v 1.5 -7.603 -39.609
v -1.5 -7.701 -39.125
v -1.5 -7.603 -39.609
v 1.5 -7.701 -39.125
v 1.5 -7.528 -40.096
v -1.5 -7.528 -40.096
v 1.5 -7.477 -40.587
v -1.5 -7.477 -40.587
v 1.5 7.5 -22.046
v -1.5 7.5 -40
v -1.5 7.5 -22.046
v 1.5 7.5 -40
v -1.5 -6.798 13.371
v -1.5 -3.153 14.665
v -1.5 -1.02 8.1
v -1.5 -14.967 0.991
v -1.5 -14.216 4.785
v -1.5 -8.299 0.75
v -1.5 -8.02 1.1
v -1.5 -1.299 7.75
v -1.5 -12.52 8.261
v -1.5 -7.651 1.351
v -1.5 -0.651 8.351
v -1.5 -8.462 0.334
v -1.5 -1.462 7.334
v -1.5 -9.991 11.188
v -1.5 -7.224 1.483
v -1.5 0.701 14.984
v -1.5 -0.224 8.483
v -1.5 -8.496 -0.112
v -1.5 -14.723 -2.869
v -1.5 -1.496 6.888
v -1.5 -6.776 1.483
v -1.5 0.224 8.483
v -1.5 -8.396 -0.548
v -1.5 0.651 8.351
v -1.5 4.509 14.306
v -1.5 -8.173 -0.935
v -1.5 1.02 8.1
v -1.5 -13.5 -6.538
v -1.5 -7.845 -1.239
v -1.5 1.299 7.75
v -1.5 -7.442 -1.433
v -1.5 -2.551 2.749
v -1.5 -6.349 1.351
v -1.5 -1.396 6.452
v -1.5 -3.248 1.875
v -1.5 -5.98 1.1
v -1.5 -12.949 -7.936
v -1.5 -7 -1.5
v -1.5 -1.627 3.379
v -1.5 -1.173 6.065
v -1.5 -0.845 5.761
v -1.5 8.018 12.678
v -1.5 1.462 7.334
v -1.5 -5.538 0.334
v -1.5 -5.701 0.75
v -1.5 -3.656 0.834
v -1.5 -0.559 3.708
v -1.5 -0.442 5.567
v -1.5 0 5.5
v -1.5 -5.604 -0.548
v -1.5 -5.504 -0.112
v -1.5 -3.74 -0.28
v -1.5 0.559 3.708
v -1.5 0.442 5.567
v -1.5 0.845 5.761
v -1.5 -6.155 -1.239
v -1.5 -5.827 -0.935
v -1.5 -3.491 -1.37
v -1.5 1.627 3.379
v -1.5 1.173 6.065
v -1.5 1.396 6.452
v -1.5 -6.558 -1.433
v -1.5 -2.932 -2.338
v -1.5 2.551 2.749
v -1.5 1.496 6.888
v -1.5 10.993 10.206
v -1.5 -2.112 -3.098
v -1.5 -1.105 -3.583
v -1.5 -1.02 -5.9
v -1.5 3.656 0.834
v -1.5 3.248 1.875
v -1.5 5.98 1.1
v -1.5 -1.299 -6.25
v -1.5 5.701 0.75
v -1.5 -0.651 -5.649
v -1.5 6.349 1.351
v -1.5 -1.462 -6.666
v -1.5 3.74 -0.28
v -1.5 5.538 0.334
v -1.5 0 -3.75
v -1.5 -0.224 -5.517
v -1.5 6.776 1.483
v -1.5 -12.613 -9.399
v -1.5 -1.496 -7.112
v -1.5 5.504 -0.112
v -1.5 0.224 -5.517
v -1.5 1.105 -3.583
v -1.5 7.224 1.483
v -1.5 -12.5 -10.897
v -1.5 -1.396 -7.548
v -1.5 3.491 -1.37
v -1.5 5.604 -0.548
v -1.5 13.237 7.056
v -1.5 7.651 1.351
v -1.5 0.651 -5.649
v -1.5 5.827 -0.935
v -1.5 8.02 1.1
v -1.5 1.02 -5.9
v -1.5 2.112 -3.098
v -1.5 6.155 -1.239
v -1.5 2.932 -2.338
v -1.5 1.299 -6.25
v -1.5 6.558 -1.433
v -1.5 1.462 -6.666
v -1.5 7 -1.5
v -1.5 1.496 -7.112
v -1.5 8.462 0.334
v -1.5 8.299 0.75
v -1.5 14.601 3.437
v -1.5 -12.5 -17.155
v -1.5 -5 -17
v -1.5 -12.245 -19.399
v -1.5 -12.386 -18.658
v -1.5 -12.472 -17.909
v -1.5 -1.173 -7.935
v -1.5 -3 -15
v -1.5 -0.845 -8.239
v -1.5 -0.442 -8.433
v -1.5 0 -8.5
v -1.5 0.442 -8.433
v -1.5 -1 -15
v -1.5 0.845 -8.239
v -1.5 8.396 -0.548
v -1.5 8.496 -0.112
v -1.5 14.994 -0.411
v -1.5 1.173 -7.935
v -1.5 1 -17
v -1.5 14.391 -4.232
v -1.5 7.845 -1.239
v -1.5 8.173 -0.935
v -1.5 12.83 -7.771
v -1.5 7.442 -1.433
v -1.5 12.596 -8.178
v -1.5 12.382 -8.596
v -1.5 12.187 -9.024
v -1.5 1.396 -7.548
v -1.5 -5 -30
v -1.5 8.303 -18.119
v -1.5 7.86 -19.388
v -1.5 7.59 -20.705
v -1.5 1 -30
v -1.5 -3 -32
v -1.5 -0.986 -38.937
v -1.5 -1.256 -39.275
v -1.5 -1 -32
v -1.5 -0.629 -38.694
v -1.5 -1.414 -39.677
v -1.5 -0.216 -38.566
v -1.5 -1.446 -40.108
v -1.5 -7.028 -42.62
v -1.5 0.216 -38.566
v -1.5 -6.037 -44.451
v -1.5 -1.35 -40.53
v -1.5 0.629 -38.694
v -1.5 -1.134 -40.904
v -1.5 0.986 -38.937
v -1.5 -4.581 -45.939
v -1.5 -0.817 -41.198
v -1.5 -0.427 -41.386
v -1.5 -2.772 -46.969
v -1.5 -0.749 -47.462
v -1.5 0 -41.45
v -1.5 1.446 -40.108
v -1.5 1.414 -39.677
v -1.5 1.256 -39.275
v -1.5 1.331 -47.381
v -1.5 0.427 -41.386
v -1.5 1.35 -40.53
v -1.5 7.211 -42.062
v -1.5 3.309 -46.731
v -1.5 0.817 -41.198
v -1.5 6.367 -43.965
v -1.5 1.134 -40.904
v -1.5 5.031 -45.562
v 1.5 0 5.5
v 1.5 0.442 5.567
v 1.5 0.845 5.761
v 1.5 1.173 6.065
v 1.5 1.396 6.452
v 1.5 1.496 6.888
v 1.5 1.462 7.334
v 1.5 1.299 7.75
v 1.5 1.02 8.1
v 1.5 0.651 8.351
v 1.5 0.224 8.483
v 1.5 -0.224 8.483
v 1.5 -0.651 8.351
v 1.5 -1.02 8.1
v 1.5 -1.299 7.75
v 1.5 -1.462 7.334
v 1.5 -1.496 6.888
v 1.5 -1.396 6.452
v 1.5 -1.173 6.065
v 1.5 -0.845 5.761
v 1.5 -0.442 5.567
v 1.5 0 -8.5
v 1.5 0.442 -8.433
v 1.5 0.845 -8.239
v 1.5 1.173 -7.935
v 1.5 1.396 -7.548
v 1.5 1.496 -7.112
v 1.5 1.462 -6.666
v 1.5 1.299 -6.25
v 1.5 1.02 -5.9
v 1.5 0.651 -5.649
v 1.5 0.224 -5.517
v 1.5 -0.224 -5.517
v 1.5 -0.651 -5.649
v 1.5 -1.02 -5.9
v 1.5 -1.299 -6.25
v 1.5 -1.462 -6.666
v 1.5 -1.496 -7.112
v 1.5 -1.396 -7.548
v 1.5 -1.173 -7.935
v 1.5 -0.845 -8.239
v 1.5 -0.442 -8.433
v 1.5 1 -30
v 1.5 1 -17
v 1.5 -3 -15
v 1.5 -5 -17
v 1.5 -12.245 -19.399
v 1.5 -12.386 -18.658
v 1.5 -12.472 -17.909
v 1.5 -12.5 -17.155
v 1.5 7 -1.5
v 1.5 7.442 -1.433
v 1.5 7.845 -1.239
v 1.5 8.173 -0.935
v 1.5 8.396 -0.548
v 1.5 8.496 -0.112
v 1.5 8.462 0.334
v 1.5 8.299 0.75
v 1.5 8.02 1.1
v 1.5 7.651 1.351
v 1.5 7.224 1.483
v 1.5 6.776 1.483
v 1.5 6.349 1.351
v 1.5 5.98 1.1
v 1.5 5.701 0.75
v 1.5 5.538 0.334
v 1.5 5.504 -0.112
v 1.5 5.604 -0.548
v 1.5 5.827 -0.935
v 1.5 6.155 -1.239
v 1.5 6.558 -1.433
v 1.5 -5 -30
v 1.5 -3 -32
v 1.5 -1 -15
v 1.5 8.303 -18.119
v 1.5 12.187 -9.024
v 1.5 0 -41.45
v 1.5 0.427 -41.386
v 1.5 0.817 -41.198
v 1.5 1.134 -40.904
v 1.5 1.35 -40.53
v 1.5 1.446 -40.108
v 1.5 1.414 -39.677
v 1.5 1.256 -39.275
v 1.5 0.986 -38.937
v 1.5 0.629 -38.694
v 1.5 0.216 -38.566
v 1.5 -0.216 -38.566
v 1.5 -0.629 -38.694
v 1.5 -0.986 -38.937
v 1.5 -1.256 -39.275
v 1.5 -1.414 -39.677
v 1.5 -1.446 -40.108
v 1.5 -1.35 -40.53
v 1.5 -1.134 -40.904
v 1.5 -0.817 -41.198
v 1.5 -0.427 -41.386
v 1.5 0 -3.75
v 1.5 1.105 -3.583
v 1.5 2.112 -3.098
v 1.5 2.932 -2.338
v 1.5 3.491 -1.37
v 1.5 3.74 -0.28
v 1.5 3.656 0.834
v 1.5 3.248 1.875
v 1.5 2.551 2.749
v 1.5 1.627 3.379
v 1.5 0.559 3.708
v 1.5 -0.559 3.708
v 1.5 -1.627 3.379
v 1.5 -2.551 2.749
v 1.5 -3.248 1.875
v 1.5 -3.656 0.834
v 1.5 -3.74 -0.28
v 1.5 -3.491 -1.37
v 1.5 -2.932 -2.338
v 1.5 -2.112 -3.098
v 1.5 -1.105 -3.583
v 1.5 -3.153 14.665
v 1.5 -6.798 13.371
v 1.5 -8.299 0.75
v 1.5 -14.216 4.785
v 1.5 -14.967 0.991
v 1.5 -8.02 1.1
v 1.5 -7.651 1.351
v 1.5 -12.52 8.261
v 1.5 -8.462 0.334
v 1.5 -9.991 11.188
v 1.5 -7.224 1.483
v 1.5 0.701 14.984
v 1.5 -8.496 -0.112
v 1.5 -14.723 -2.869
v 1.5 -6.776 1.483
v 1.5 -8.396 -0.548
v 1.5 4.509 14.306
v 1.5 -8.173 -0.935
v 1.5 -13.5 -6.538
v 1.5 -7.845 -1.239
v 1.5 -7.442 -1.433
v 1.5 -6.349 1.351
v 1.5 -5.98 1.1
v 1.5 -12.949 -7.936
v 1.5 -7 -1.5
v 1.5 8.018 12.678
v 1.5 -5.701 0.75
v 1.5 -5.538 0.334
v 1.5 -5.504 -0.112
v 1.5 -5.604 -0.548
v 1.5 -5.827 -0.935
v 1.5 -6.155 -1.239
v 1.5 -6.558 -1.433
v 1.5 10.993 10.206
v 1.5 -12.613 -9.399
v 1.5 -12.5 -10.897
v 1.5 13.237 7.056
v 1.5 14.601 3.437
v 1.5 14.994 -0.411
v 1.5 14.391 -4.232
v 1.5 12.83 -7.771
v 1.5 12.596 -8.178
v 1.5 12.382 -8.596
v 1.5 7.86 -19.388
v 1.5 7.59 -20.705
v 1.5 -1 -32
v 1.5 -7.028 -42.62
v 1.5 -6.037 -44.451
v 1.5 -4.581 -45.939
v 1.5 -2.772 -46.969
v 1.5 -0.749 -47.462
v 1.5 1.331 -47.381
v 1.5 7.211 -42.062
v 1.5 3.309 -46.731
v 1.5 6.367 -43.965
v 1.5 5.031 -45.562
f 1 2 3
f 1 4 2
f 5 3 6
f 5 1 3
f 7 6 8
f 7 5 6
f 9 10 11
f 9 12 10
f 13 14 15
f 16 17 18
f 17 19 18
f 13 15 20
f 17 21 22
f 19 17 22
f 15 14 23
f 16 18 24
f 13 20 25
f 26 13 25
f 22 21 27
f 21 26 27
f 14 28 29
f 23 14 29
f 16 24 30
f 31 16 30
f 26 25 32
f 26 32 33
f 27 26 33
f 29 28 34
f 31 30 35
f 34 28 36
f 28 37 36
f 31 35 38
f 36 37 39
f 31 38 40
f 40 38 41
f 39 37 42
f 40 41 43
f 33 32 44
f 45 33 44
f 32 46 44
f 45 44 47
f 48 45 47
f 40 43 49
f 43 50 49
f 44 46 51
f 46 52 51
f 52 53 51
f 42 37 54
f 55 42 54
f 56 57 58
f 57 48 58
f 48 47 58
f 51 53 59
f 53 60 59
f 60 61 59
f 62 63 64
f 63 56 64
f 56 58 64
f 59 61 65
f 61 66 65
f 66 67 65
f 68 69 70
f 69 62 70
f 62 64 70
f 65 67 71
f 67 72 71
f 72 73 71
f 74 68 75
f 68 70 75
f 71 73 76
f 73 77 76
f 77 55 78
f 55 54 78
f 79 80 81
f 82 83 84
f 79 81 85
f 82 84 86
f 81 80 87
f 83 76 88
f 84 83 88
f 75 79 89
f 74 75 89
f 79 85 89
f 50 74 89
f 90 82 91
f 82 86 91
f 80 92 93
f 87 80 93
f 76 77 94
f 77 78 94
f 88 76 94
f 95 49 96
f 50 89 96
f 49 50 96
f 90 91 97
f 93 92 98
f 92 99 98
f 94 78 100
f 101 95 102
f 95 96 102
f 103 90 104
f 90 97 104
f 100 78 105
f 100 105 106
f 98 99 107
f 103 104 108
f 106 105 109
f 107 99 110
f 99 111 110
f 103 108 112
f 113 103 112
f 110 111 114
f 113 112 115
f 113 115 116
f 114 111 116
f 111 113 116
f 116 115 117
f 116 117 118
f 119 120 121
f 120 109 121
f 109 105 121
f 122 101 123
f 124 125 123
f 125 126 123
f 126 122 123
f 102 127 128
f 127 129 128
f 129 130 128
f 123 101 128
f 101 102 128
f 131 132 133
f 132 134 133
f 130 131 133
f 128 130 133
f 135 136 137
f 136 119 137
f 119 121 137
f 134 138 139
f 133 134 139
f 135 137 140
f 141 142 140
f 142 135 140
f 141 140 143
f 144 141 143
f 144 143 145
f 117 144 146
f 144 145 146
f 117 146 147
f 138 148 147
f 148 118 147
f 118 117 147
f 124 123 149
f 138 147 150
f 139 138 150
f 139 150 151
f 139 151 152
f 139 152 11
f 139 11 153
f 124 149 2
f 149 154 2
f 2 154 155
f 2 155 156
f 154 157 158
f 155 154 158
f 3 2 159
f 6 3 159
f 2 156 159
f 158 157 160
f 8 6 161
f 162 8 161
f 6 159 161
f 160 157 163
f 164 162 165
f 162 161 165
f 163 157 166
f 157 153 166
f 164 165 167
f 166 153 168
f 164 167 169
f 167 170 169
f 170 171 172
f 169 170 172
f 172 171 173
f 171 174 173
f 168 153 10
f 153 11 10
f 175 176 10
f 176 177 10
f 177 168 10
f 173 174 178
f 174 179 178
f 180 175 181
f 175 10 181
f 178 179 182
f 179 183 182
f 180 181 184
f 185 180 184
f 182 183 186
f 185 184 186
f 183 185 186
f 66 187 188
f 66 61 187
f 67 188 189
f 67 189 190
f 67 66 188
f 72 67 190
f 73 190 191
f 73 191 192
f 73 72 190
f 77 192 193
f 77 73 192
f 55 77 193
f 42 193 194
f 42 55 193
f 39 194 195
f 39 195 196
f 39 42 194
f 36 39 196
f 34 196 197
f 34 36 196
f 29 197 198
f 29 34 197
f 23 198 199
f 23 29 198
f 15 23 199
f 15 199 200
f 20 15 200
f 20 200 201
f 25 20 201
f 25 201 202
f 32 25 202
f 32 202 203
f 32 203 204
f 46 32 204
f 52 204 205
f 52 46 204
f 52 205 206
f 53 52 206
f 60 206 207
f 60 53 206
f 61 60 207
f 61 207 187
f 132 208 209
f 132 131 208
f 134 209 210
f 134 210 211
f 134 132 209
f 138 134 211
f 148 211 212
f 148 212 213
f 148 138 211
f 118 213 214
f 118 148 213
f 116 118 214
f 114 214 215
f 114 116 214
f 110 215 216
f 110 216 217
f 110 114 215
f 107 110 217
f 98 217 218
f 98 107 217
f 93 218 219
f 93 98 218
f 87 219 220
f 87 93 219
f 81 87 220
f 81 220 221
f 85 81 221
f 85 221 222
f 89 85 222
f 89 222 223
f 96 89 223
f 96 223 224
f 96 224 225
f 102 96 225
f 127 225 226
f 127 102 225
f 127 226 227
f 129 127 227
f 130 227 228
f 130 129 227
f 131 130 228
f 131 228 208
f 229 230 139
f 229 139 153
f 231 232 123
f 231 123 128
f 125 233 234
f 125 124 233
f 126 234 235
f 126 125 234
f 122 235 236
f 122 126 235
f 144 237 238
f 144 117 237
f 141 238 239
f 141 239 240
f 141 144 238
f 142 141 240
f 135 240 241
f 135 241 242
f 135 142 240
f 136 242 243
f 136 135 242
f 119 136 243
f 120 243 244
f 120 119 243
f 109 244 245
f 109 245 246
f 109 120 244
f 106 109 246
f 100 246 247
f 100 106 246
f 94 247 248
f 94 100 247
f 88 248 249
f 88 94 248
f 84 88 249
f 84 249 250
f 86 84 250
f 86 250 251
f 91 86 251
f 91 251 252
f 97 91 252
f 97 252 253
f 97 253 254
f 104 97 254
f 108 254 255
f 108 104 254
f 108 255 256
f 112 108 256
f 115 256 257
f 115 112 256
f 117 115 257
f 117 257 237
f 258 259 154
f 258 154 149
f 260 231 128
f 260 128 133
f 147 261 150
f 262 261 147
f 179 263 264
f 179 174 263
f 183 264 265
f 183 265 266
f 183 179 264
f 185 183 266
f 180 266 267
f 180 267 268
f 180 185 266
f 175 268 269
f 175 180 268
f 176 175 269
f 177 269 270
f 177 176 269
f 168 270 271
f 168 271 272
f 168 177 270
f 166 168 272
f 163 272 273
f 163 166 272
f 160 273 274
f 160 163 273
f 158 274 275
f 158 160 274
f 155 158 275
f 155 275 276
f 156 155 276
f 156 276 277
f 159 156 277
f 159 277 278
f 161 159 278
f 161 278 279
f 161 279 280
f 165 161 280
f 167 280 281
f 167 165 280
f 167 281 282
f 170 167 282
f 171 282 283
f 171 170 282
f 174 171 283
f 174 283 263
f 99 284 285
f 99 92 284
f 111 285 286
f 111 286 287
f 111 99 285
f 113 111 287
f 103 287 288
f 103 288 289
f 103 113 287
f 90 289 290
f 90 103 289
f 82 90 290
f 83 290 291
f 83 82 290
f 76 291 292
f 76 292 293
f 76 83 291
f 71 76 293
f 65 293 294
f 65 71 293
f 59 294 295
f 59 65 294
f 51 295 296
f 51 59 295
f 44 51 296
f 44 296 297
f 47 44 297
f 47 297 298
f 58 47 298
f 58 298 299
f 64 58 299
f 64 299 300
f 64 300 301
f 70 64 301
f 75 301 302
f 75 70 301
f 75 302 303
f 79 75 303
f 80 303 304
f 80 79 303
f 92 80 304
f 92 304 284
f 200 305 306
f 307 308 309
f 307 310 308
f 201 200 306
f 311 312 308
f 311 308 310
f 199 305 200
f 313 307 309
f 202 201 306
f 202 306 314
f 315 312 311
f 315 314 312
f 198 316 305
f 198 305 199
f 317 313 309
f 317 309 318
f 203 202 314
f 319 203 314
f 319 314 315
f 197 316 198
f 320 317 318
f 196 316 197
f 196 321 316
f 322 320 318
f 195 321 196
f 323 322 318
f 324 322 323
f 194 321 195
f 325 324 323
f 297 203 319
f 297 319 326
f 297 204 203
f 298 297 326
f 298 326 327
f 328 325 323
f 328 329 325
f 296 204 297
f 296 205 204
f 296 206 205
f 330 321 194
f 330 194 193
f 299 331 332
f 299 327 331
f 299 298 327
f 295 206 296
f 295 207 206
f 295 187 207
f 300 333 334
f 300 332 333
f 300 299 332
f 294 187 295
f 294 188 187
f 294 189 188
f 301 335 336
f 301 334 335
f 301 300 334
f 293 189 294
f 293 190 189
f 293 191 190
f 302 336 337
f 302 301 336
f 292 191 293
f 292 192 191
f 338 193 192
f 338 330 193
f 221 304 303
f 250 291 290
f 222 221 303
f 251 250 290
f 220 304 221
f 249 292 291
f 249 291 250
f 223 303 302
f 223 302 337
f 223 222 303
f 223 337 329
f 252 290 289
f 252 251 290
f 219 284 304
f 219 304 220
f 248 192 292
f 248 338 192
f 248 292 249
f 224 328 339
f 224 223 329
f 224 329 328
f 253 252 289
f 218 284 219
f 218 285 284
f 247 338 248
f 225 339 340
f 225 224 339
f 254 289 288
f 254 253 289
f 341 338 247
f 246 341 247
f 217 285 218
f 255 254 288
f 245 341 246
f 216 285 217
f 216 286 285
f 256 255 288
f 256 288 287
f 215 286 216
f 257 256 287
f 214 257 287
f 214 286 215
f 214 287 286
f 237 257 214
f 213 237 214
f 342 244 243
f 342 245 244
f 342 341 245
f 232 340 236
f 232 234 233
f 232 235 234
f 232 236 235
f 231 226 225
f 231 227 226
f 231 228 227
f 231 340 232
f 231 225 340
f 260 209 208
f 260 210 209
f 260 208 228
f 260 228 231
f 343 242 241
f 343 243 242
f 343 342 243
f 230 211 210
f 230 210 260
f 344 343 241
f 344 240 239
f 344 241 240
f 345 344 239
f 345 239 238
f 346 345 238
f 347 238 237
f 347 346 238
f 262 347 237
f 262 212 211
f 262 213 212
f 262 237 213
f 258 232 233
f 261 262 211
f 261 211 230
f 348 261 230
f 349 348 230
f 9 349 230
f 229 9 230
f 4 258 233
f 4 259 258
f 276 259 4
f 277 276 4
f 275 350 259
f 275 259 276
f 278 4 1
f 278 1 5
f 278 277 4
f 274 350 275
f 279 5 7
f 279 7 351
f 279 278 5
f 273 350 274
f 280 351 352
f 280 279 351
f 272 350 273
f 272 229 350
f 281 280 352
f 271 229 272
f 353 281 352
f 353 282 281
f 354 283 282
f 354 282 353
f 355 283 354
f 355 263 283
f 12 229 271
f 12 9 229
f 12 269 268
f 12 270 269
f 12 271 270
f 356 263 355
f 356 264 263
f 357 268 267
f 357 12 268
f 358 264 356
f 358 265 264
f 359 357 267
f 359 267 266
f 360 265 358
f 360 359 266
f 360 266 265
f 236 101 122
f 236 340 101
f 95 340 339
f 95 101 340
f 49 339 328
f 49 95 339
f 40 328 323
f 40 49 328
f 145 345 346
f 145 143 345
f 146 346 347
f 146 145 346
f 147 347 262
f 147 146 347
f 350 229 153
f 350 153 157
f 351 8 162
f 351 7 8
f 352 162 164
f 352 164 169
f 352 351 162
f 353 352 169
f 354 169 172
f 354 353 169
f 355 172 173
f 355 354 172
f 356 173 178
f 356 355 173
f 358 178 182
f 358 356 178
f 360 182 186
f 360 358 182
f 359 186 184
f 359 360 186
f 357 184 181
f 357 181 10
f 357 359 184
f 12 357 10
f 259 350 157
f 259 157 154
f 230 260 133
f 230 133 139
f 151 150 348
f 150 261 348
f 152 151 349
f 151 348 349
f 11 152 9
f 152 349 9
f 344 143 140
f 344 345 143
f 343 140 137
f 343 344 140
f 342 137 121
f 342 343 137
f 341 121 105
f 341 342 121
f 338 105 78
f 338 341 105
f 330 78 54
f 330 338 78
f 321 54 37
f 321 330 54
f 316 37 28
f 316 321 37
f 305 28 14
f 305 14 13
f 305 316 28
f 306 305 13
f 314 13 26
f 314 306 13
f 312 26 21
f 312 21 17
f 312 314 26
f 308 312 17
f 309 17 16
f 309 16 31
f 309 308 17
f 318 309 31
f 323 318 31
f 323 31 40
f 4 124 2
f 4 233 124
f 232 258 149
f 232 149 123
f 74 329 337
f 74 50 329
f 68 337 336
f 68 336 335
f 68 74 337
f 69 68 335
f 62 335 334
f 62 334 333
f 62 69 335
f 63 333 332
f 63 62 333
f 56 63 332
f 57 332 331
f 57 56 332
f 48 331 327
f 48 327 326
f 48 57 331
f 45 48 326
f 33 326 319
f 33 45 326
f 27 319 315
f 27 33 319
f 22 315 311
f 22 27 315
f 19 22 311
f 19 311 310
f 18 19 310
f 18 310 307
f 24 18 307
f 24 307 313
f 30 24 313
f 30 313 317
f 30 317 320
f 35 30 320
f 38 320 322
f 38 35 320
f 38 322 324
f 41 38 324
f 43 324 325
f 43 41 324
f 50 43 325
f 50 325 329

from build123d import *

# Parameters (mm, degrees)
SKETCH1_R           = 7.5
SKETCH1_R_2         = 1.45
SKETCH1_R_3         = 1.5
SKETCH1_R_4         = 3.75
BOSS_EXTRUDE1_DEPTH = 1.5
FILLET1_R           = 10
CUT_EXTRUDE1_DEPTH  = 3


with BuildPart() as part:
    # Sketch1 → Boss-Extrude1 (new body, symmetric)
    with BuildSketch(Plane(origin=(0, 0, 0), x_dir=(0, 0, -1), z_dir=(1, 0, 0))):
        with BuildLine():
            Line((18.291561976, -12.5), (40, -7.5))
            ThreePointArc((40, -7.5), (32.5, 0), (40, 7.5))
            Line((40, 7.5), (20, 7.5))
            Line((20, 7.5), (8.291561976, 12.5))
            ThreePointArc((8.291561976, 12.5), (13.216910184, 7.093185827), (15, 0))
            ThreePointArc((15, 0), (13.216910184, -7.093185827), (8.291561976, -12.5))
            Line((8.291561976, -12.5), (18.291561976, -12.5))
        make_face()
        with Locations((40, 0)):
            Circle(SKETCH1_R)
        with Locations((40, 0)):
            Circle(SKETCH1_R_2, mode=Mode.SUBTRACT)
        with BuildLine():
            ThreePointArc((8.291561976, 12.5), (-15, 0), (8.291561976, -12.5))
            ThreePointArc((8.291561976, -12.5), (13.216910184, -7.093185827), (15, 0))
            ThreePointArc((15, 0), (13.216910184, 7.093185827), (8.291561976, 12.5))
        make_face()
        with Locations((0, -7)):
            Circle(SKETCH1_R_3, mode=Mode.SUBTRACT)
        with Locations((-7, 0)):
            Circle(SKETCH1_R_3, mode=Mode.SUBTRACT)
        Circle(SKETCH1_R_4, mode=Mode.SUBTRACT)
        with Locations((0, 7)):
            Circle(SKETCH1_R_3, mode=Mode.SUBTRACT)
        with Locations((7, 0)):
            Circle(SKETCH1_R_3, mode=Mode.SUBTRACT)
    extrude(amount=BOSS_EXTRUDE1_DEPTH, both=True)

    # Fillet1
    fillet1_edges = [part.edges().sort_by_distance(p)[0] for p in [
        (0, -12.5, -18.291561976),
        (0, -12.5, -8.291561976),
        (0, 12.5, -8.291561976),
        (0, 7.5, -20),
        (0, -7.5, -40),
    ]]
    fillet(fillet1_edges, radius=FILLET1_R)

    # Sketch2 → Cut-Extrude1 (cut)
    with BuildSketch(Plane(origin=(1.5, 0, 0), x_dir=(0, 0, -1), z_dir=(1, 0, 0))):
        Polygon((17, 1), (30, 1), (32, -1), (32, -3), (30, -5), (17, -5), (15, -3), (15, -1), align=None)
    extrude(amount=-CUT_EXTRUDE1_DEPTH, mode=Mode.SUBTRACT)


solid = part.part
